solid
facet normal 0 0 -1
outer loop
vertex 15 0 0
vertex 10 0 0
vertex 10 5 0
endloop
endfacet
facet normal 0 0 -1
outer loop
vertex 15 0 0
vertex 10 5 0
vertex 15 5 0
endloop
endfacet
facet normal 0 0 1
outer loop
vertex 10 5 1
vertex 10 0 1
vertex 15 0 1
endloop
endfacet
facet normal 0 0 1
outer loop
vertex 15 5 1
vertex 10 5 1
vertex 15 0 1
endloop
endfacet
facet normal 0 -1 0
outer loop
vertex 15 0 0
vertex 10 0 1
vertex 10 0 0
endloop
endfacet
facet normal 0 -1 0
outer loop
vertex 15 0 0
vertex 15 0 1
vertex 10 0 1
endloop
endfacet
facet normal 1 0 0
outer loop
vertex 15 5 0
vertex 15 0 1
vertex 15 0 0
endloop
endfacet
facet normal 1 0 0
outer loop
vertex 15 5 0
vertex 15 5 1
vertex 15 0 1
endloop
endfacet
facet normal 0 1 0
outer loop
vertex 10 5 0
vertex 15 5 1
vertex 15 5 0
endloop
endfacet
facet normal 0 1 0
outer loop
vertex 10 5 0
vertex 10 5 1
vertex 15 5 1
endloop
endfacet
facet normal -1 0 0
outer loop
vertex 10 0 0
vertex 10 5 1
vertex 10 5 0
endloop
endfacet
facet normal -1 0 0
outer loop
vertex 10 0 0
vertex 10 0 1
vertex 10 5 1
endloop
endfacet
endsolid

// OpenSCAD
linear_extrude(1)
    translate([10, 0])
        square(5);
